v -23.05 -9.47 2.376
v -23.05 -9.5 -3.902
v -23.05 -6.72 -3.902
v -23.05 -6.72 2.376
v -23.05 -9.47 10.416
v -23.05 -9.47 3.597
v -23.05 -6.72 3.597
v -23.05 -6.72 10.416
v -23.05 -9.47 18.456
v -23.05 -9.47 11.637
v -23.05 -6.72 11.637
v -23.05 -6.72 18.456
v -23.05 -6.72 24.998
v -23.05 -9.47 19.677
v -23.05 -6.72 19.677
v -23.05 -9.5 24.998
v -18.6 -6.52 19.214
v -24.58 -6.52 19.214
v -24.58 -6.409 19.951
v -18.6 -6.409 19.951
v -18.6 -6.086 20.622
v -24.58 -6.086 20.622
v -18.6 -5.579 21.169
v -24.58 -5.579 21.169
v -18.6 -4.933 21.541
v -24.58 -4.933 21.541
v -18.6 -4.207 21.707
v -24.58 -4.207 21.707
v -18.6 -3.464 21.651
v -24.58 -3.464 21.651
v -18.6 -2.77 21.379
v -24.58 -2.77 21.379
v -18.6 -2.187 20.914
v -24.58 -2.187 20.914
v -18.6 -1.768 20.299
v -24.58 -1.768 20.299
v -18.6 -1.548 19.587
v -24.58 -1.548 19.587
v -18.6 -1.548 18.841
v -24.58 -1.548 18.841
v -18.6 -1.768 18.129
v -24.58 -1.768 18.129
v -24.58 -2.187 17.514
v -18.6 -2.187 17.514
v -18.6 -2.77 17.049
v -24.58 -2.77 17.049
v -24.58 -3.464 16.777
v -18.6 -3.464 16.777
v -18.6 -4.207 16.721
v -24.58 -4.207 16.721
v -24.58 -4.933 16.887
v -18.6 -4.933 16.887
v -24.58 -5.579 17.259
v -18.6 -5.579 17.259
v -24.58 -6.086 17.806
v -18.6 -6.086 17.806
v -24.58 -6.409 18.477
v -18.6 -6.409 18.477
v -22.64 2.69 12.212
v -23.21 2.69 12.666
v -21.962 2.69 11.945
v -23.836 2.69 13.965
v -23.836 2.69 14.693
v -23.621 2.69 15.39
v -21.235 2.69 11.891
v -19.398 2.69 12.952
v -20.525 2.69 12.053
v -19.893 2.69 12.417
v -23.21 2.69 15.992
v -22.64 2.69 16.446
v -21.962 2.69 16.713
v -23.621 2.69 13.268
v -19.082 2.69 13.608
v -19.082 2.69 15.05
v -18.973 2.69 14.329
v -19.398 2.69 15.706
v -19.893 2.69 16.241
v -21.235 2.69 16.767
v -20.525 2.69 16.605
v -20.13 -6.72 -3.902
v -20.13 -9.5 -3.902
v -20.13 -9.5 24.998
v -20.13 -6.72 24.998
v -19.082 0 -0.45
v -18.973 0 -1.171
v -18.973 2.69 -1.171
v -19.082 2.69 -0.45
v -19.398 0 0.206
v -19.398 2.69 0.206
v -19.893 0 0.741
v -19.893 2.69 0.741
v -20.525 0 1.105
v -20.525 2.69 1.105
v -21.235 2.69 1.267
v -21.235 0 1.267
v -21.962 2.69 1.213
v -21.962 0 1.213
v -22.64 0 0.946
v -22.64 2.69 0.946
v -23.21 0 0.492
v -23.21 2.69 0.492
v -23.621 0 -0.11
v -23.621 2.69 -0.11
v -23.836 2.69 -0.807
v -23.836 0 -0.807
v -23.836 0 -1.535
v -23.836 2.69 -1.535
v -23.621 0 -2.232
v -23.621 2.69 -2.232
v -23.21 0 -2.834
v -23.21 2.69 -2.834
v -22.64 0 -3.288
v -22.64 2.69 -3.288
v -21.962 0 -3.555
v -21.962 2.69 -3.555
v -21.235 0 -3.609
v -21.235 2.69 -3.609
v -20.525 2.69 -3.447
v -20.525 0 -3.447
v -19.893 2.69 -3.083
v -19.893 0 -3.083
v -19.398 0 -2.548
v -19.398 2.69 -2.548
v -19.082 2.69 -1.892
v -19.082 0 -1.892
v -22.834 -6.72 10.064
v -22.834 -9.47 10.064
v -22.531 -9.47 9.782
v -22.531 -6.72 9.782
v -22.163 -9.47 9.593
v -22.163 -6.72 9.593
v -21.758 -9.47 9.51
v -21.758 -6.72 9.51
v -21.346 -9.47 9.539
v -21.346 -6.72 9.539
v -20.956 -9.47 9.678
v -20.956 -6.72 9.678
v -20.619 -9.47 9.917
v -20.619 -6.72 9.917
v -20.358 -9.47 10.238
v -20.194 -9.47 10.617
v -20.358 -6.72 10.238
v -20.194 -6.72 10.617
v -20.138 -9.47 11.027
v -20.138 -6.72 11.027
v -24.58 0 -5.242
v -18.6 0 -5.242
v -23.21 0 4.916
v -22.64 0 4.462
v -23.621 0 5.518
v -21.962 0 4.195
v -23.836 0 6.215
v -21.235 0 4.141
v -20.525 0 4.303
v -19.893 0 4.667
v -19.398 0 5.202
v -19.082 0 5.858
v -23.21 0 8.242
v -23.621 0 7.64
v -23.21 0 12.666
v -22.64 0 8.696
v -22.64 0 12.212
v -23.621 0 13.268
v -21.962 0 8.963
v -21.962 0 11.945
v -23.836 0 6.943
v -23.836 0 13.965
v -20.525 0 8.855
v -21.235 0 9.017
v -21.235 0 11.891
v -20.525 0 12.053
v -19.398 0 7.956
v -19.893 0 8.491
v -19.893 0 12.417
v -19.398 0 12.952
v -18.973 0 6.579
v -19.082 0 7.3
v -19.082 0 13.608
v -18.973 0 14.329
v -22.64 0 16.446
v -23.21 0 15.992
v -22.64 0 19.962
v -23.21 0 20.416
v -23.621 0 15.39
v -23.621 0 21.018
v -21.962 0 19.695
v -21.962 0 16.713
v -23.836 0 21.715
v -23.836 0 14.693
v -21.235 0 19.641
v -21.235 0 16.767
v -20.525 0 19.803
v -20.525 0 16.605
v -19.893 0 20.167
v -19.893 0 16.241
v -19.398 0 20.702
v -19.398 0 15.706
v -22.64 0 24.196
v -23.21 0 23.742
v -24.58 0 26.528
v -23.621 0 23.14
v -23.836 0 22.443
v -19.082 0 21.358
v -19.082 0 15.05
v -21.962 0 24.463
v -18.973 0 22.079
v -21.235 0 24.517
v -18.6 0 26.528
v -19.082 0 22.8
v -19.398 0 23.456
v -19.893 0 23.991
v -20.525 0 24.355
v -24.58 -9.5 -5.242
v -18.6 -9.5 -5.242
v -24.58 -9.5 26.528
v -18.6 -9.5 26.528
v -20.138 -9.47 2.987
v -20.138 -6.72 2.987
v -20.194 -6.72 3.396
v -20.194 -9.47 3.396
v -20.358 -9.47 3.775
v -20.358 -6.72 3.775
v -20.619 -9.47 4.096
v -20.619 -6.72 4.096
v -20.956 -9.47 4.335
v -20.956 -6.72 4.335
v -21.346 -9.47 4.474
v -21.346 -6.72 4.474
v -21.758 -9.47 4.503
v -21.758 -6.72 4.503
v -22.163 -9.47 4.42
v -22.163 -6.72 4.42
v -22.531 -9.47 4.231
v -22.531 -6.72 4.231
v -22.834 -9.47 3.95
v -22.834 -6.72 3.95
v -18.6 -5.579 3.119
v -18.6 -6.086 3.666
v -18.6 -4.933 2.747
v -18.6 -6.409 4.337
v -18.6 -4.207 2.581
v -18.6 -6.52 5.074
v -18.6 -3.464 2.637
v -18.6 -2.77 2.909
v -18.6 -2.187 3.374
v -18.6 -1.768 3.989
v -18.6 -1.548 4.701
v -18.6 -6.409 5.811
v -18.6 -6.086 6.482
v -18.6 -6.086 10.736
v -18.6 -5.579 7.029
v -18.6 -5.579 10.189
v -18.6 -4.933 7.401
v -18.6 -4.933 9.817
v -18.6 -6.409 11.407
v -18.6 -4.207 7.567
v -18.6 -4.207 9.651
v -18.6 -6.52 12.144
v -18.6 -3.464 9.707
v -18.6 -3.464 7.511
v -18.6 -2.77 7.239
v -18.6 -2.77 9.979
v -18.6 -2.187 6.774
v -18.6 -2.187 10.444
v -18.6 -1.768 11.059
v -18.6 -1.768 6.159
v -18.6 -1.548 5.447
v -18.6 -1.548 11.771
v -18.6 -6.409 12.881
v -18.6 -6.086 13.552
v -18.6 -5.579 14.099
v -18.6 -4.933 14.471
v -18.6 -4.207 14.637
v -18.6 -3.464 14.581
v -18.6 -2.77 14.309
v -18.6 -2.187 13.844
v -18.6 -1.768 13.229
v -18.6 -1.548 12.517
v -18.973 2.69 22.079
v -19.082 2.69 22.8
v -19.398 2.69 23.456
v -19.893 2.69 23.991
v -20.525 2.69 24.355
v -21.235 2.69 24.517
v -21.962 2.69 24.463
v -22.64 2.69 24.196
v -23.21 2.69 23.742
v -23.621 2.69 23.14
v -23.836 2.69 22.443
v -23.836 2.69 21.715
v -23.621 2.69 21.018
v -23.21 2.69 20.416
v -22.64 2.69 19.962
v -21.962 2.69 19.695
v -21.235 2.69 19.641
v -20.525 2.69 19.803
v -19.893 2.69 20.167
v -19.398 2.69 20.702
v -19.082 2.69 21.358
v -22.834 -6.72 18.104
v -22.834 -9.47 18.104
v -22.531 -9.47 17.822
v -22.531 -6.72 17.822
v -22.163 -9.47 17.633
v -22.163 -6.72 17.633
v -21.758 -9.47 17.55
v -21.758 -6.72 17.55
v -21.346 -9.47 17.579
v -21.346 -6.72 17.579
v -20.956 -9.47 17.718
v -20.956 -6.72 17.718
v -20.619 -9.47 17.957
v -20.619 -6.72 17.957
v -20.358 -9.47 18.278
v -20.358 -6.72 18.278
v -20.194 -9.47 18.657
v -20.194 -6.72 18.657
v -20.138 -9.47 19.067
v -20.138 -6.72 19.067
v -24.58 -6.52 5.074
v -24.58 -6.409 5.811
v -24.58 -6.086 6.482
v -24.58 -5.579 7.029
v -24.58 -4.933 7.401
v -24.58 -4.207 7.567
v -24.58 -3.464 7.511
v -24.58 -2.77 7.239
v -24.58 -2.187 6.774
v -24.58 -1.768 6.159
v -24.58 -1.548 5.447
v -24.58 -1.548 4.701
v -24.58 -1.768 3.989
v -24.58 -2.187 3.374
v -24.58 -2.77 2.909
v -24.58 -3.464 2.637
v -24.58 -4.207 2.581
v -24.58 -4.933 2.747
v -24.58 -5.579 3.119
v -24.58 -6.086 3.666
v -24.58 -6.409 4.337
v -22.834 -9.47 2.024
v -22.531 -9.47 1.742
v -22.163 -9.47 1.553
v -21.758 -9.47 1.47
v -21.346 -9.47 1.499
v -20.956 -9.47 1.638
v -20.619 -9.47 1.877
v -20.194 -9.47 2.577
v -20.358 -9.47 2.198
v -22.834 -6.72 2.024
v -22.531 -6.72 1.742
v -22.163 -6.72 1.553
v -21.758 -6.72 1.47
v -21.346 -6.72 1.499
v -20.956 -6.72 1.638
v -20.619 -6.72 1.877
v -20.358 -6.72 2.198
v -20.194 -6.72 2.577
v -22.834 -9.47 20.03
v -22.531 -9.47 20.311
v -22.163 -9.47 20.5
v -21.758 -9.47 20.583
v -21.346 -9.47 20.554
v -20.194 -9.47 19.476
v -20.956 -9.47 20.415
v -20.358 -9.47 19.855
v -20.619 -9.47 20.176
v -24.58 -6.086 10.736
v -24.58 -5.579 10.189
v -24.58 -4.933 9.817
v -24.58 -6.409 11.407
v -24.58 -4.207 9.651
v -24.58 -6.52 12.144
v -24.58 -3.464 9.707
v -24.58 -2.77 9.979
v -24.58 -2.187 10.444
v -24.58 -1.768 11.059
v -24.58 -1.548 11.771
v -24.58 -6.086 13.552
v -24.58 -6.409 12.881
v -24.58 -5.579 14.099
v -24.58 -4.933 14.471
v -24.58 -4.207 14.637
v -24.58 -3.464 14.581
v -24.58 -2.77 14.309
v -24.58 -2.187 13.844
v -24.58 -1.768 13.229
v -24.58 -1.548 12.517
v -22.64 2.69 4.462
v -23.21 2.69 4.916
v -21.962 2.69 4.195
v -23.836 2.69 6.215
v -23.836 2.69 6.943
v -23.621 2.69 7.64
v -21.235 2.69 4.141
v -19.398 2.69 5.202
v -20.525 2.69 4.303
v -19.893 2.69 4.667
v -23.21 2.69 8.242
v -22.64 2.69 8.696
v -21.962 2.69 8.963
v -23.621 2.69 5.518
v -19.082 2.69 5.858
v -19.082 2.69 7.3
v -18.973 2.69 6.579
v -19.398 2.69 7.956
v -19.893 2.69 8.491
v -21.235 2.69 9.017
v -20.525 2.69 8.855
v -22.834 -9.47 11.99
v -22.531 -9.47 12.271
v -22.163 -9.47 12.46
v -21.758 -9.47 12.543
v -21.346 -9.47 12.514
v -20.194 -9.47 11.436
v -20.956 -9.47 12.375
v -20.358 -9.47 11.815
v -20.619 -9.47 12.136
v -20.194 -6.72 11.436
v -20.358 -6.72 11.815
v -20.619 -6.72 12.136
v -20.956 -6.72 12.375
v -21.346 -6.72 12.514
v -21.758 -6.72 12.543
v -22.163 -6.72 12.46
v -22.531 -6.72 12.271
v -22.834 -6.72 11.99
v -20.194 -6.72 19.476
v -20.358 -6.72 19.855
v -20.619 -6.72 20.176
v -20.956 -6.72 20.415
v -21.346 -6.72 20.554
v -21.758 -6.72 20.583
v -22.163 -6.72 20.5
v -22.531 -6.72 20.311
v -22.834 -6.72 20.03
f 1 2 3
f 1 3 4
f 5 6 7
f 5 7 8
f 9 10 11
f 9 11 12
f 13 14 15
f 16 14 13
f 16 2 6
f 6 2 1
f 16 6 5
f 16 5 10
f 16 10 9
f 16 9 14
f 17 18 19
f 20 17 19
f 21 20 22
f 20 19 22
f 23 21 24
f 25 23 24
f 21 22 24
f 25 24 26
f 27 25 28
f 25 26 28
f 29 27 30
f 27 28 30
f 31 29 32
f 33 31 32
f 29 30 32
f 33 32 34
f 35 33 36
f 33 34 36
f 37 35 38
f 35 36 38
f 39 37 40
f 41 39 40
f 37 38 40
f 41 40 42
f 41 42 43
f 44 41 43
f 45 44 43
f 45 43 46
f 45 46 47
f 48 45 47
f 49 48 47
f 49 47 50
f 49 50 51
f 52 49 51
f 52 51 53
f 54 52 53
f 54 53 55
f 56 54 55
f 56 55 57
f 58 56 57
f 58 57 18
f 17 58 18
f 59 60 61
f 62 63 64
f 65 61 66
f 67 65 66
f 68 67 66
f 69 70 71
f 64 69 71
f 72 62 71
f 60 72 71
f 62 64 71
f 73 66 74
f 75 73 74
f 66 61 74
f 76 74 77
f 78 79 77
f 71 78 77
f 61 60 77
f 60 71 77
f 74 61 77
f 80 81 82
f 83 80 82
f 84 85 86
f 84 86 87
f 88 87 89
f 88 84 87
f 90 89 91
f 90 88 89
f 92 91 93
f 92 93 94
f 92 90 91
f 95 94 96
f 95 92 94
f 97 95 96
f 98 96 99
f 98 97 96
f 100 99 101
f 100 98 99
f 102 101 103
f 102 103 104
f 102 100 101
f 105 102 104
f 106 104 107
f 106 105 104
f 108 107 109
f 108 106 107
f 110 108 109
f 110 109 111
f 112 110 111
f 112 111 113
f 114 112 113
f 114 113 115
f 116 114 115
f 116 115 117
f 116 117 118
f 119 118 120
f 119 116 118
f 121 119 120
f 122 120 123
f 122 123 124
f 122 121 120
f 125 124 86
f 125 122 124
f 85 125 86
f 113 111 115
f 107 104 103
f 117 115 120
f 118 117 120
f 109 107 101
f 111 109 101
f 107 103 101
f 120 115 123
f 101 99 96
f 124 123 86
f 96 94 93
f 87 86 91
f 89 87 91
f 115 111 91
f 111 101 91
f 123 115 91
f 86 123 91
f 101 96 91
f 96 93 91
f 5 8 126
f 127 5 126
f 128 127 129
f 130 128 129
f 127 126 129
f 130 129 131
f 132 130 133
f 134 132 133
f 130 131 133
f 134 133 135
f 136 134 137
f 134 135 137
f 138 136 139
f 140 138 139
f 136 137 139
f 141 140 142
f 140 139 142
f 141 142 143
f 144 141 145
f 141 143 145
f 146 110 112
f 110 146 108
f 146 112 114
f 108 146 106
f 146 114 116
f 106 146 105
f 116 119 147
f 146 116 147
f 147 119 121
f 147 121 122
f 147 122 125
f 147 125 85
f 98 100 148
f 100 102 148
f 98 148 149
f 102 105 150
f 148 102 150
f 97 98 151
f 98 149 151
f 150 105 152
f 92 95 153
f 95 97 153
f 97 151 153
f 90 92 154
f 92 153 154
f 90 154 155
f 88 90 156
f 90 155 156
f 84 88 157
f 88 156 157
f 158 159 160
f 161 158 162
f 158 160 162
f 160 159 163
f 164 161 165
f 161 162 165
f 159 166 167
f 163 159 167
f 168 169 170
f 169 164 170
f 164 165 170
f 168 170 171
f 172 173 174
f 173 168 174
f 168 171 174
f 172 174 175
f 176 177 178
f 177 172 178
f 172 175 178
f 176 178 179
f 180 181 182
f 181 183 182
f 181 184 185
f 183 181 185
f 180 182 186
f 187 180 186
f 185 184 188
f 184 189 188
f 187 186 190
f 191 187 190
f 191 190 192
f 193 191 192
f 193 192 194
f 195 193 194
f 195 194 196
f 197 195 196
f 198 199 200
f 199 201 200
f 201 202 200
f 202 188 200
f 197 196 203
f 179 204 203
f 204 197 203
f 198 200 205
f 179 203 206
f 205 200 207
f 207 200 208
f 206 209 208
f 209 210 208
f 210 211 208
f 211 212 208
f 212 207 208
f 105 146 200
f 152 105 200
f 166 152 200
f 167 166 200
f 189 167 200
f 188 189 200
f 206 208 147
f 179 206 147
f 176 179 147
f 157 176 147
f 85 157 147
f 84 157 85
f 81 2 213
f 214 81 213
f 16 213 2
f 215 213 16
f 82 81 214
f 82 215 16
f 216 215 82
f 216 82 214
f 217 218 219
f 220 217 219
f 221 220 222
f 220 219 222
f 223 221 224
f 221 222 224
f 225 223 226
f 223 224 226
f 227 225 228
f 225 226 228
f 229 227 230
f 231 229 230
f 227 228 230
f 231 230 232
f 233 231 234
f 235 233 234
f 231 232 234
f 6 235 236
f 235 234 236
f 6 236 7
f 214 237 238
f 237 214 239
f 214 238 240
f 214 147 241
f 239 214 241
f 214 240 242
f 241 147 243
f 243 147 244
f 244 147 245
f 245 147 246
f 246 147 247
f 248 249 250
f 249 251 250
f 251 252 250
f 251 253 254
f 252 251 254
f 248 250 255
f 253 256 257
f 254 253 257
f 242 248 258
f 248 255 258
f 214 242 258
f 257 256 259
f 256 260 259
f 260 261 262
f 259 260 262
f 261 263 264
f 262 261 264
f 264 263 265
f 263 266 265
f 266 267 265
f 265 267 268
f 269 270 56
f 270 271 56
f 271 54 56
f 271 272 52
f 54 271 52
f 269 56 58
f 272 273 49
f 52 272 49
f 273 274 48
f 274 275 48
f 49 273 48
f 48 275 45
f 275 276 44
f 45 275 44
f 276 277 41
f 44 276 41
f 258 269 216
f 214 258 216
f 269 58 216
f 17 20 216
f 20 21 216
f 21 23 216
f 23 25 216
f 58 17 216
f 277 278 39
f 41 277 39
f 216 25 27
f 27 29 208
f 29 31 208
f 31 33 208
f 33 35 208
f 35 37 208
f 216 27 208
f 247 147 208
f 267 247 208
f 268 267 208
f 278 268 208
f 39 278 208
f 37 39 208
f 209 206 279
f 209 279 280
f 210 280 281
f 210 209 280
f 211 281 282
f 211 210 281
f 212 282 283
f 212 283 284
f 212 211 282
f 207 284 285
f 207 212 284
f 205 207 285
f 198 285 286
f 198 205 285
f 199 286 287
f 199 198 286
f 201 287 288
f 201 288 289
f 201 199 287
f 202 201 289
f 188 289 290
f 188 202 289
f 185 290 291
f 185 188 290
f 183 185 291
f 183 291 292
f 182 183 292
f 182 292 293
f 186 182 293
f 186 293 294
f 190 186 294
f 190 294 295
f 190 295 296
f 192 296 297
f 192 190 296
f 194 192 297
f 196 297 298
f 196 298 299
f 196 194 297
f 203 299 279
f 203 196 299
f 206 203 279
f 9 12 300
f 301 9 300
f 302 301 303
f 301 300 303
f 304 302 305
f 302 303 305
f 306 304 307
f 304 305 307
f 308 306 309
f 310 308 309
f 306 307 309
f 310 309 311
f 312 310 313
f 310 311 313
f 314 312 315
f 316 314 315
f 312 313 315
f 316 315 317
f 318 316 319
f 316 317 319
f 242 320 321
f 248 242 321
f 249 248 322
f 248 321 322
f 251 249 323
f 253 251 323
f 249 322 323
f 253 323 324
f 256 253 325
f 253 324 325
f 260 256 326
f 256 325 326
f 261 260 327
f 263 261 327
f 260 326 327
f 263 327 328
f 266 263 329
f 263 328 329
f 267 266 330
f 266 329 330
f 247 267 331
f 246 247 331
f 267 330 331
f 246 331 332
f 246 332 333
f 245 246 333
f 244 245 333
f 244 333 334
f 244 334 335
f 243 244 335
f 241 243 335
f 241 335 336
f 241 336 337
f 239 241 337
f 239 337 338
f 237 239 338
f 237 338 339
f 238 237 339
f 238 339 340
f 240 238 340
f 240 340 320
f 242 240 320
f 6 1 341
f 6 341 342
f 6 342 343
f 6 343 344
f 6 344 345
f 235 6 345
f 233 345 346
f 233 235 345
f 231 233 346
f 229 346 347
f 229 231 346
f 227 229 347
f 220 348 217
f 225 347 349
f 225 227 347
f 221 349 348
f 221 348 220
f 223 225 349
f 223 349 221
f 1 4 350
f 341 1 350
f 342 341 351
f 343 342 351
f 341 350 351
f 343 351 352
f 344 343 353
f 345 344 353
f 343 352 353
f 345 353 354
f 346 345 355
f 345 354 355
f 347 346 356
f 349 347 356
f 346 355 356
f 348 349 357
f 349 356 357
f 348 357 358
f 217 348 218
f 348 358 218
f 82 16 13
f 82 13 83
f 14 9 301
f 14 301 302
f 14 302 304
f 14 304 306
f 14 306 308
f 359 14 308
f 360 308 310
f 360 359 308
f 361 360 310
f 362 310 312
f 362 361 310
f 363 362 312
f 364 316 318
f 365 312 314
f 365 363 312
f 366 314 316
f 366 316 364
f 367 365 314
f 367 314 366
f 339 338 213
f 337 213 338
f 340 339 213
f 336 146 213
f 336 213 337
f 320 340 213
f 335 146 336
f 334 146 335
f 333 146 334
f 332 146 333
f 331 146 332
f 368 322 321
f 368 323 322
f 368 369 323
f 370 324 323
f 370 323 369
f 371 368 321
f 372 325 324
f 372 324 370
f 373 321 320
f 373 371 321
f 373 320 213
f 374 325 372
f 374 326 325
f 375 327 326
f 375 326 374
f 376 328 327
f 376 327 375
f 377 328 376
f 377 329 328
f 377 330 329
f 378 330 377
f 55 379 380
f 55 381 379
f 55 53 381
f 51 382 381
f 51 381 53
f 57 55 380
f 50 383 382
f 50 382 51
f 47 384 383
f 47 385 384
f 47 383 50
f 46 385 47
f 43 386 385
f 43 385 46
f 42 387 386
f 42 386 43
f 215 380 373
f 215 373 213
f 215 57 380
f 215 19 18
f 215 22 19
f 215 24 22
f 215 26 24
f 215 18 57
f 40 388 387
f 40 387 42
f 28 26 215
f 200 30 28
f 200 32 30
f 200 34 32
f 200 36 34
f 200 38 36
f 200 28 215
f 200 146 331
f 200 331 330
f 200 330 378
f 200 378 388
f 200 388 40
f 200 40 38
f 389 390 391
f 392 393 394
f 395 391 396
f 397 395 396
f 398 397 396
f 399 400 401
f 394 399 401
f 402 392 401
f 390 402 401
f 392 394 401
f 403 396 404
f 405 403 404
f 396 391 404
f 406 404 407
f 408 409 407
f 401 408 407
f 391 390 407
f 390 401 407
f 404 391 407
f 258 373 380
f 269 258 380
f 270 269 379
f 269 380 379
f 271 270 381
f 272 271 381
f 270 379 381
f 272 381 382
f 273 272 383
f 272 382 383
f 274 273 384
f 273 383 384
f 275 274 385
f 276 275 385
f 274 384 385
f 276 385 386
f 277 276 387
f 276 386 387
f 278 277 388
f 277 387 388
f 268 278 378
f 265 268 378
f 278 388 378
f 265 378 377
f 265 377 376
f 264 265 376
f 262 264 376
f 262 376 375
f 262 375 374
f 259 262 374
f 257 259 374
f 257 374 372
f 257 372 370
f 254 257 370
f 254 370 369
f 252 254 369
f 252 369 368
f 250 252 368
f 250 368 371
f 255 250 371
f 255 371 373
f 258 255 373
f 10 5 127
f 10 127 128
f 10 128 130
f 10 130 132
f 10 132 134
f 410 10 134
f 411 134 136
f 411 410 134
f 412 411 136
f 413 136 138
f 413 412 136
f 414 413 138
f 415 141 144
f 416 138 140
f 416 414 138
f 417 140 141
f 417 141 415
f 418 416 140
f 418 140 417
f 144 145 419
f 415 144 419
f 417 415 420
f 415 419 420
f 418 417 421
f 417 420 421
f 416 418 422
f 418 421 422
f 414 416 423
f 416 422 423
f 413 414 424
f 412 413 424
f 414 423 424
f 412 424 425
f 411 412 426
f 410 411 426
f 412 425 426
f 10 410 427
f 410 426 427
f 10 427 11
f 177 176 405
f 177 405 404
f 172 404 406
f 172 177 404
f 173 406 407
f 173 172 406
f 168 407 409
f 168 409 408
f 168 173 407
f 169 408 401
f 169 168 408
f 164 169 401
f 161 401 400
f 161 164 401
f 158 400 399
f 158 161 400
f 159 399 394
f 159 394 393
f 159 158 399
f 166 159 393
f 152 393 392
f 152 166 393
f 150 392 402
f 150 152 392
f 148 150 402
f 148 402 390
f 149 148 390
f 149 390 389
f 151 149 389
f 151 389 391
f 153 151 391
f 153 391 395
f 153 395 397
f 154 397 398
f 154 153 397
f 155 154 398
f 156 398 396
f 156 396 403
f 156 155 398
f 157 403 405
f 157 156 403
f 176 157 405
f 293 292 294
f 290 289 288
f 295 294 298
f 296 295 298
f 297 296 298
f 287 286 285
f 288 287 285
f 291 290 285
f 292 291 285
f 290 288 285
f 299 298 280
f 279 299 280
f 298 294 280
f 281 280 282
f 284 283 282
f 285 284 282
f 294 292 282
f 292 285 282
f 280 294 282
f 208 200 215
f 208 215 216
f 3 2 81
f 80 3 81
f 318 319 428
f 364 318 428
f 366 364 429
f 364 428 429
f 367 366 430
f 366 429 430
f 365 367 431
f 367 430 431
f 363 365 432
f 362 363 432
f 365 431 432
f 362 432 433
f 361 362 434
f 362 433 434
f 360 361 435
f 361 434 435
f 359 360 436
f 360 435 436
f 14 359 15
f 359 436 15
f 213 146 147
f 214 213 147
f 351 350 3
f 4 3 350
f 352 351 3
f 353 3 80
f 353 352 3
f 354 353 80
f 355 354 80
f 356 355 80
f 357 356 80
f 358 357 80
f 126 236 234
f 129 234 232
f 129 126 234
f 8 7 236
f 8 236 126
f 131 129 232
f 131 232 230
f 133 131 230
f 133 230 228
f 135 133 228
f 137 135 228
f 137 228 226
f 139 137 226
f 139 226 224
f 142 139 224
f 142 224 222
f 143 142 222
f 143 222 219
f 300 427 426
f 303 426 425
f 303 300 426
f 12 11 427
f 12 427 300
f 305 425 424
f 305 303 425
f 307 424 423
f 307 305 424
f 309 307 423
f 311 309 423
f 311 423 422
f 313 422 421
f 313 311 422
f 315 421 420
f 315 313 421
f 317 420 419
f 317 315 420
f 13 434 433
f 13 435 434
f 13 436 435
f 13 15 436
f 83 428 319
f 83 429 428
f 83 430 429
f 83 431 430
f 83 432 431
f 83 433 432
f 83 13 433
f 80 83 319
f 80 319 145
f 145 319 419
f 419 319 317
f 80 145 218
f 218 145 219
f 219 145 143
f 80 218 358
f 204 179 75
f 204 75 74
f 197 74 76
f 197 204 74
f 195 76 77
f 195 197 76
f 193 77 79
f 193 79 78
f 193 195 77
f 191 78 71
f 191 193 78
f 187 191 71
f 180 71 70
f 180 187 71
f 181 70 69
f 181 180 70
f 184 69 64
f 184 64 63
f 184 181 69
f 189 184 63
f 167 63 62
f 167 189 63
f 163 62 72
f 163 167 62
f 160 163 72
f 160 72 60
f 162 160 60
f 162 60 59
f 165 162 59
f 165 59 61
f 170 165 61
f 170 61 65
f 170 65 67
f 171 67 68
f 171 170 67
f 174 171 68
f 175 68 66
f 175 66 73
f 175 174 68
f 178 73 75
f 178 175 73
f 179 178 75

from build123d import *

# Parameters (mm, degrees)
F0_W     = 5.98
F0_H     = 31.77
F1_DEPTH = 9.5
F3_D     = 5
F4_R     = 2.445
F5_DEPTH = 2.69
F6_W     = 2.92
F6_H     = 28.9
F7_DEPTH = 2.78
F9_DEPTH = 2.75


with BuildPart() as f1:
    # F0 (on Front) → F1 (new body)
    with BuildSketch(Plane.XZ):
        with Locations((-21.5895947321, 10.6426752984)):
            Rectangle(F0_W, F0_H)
    extrude(amount=F1_DEPTH)

    # F3 (through all)
    with Locations(Plane.YZ):
        with Locations((-4.02, 19.2140168432), (-4.02, 12.1440168432), (-4.02, 5.0740168432)):
            Hole(F3_D / 2)

    # F4 (on Front) → F5 (join)
    with BuildSketch(Plane.XZ):
        with Locations((-21.4179256038, 22.0790577062)):
            Circle(F4_R)
        with Locations((-21.4179256038, 14.3290577062)):
            Circle(F4_R)
        with Locations((-21.4179256038, 6.5790577062)):
            Circle(F4_R)
        with Locations((-21.4179256038, -1.1709422938)):
            Circle(F4_R)
    extrude(amount=-F5_DEPTH)

    # F6 (on face) → F7 (cut)
    with BuildSketch(Plane.XZ.offset(9.5)):
        with Locations((-21.5895947321, 10.5476752984)):
            Rectangle(F6_W, F6_H)
    extrude(amount=-F7_DEPTH, mode=Mode.SUBTRACT)

    # F8 (on face) → F9 (join)
    with BuildSketch(Plane.XZ.offset(6.72)):
        with BuildLine():
            ThreePointArc((-23.0495947321, 18.4560718795), (-21.345700419, 17.5789010333), (-20.1375805098, 19.0665605403))
            ThreePointArc((-20.1375805098, 19.0665605403), (-21.345700419, 20.5542200474), (-23.0495947321, 19.6770492011))
            Line((-23.0495947321, 19.6770492011), (-23.0495947321, 18.4560718795))
        make_face()
        with BuildLine():
            ThreePointArc((-20.1375805098, 11.0265605403), (-21.345700419, 12.5142200474), (-23.0495947321, 11.6370492011))
            Line((-23.0495947321, 11.6370492011), (-23.0495947321, 10.4160718795))
            ThreePointArc((-23.0495947321, 10.4160718795), (-21.345700419, 9.5389010333), (-20.1375805098, 11.0265605403))
        make_face()
        with BuildLine():
            Line((-23.0495947321, 2.3760718795), (-23.0495947321, 3.5970492011))
            ThreePointArc((-23.0495947321, 3.5970492011), (-23.1775805098, 2.9865605403), (-23.0495947321, 2.3760718795))
        make_face()
        with BuildLine():
            ThreePointArc((-20.1375805098, 2.9865605403), (-21.345700419, 4.4742200474), (-23.0495947321, 3.5970492011))
            Line((-23.0495947321, 3.5970492011), (-23.0495947321, 2.3760718795))
            ThreePointArc((-23.0495947321, 2.3760718795), (-21.345700419, 1.4989010333), (-20.1375805098, 2.9865605403))
        make_face()
    extrude(amount=F9_DEPTH)


solid = f1.part
